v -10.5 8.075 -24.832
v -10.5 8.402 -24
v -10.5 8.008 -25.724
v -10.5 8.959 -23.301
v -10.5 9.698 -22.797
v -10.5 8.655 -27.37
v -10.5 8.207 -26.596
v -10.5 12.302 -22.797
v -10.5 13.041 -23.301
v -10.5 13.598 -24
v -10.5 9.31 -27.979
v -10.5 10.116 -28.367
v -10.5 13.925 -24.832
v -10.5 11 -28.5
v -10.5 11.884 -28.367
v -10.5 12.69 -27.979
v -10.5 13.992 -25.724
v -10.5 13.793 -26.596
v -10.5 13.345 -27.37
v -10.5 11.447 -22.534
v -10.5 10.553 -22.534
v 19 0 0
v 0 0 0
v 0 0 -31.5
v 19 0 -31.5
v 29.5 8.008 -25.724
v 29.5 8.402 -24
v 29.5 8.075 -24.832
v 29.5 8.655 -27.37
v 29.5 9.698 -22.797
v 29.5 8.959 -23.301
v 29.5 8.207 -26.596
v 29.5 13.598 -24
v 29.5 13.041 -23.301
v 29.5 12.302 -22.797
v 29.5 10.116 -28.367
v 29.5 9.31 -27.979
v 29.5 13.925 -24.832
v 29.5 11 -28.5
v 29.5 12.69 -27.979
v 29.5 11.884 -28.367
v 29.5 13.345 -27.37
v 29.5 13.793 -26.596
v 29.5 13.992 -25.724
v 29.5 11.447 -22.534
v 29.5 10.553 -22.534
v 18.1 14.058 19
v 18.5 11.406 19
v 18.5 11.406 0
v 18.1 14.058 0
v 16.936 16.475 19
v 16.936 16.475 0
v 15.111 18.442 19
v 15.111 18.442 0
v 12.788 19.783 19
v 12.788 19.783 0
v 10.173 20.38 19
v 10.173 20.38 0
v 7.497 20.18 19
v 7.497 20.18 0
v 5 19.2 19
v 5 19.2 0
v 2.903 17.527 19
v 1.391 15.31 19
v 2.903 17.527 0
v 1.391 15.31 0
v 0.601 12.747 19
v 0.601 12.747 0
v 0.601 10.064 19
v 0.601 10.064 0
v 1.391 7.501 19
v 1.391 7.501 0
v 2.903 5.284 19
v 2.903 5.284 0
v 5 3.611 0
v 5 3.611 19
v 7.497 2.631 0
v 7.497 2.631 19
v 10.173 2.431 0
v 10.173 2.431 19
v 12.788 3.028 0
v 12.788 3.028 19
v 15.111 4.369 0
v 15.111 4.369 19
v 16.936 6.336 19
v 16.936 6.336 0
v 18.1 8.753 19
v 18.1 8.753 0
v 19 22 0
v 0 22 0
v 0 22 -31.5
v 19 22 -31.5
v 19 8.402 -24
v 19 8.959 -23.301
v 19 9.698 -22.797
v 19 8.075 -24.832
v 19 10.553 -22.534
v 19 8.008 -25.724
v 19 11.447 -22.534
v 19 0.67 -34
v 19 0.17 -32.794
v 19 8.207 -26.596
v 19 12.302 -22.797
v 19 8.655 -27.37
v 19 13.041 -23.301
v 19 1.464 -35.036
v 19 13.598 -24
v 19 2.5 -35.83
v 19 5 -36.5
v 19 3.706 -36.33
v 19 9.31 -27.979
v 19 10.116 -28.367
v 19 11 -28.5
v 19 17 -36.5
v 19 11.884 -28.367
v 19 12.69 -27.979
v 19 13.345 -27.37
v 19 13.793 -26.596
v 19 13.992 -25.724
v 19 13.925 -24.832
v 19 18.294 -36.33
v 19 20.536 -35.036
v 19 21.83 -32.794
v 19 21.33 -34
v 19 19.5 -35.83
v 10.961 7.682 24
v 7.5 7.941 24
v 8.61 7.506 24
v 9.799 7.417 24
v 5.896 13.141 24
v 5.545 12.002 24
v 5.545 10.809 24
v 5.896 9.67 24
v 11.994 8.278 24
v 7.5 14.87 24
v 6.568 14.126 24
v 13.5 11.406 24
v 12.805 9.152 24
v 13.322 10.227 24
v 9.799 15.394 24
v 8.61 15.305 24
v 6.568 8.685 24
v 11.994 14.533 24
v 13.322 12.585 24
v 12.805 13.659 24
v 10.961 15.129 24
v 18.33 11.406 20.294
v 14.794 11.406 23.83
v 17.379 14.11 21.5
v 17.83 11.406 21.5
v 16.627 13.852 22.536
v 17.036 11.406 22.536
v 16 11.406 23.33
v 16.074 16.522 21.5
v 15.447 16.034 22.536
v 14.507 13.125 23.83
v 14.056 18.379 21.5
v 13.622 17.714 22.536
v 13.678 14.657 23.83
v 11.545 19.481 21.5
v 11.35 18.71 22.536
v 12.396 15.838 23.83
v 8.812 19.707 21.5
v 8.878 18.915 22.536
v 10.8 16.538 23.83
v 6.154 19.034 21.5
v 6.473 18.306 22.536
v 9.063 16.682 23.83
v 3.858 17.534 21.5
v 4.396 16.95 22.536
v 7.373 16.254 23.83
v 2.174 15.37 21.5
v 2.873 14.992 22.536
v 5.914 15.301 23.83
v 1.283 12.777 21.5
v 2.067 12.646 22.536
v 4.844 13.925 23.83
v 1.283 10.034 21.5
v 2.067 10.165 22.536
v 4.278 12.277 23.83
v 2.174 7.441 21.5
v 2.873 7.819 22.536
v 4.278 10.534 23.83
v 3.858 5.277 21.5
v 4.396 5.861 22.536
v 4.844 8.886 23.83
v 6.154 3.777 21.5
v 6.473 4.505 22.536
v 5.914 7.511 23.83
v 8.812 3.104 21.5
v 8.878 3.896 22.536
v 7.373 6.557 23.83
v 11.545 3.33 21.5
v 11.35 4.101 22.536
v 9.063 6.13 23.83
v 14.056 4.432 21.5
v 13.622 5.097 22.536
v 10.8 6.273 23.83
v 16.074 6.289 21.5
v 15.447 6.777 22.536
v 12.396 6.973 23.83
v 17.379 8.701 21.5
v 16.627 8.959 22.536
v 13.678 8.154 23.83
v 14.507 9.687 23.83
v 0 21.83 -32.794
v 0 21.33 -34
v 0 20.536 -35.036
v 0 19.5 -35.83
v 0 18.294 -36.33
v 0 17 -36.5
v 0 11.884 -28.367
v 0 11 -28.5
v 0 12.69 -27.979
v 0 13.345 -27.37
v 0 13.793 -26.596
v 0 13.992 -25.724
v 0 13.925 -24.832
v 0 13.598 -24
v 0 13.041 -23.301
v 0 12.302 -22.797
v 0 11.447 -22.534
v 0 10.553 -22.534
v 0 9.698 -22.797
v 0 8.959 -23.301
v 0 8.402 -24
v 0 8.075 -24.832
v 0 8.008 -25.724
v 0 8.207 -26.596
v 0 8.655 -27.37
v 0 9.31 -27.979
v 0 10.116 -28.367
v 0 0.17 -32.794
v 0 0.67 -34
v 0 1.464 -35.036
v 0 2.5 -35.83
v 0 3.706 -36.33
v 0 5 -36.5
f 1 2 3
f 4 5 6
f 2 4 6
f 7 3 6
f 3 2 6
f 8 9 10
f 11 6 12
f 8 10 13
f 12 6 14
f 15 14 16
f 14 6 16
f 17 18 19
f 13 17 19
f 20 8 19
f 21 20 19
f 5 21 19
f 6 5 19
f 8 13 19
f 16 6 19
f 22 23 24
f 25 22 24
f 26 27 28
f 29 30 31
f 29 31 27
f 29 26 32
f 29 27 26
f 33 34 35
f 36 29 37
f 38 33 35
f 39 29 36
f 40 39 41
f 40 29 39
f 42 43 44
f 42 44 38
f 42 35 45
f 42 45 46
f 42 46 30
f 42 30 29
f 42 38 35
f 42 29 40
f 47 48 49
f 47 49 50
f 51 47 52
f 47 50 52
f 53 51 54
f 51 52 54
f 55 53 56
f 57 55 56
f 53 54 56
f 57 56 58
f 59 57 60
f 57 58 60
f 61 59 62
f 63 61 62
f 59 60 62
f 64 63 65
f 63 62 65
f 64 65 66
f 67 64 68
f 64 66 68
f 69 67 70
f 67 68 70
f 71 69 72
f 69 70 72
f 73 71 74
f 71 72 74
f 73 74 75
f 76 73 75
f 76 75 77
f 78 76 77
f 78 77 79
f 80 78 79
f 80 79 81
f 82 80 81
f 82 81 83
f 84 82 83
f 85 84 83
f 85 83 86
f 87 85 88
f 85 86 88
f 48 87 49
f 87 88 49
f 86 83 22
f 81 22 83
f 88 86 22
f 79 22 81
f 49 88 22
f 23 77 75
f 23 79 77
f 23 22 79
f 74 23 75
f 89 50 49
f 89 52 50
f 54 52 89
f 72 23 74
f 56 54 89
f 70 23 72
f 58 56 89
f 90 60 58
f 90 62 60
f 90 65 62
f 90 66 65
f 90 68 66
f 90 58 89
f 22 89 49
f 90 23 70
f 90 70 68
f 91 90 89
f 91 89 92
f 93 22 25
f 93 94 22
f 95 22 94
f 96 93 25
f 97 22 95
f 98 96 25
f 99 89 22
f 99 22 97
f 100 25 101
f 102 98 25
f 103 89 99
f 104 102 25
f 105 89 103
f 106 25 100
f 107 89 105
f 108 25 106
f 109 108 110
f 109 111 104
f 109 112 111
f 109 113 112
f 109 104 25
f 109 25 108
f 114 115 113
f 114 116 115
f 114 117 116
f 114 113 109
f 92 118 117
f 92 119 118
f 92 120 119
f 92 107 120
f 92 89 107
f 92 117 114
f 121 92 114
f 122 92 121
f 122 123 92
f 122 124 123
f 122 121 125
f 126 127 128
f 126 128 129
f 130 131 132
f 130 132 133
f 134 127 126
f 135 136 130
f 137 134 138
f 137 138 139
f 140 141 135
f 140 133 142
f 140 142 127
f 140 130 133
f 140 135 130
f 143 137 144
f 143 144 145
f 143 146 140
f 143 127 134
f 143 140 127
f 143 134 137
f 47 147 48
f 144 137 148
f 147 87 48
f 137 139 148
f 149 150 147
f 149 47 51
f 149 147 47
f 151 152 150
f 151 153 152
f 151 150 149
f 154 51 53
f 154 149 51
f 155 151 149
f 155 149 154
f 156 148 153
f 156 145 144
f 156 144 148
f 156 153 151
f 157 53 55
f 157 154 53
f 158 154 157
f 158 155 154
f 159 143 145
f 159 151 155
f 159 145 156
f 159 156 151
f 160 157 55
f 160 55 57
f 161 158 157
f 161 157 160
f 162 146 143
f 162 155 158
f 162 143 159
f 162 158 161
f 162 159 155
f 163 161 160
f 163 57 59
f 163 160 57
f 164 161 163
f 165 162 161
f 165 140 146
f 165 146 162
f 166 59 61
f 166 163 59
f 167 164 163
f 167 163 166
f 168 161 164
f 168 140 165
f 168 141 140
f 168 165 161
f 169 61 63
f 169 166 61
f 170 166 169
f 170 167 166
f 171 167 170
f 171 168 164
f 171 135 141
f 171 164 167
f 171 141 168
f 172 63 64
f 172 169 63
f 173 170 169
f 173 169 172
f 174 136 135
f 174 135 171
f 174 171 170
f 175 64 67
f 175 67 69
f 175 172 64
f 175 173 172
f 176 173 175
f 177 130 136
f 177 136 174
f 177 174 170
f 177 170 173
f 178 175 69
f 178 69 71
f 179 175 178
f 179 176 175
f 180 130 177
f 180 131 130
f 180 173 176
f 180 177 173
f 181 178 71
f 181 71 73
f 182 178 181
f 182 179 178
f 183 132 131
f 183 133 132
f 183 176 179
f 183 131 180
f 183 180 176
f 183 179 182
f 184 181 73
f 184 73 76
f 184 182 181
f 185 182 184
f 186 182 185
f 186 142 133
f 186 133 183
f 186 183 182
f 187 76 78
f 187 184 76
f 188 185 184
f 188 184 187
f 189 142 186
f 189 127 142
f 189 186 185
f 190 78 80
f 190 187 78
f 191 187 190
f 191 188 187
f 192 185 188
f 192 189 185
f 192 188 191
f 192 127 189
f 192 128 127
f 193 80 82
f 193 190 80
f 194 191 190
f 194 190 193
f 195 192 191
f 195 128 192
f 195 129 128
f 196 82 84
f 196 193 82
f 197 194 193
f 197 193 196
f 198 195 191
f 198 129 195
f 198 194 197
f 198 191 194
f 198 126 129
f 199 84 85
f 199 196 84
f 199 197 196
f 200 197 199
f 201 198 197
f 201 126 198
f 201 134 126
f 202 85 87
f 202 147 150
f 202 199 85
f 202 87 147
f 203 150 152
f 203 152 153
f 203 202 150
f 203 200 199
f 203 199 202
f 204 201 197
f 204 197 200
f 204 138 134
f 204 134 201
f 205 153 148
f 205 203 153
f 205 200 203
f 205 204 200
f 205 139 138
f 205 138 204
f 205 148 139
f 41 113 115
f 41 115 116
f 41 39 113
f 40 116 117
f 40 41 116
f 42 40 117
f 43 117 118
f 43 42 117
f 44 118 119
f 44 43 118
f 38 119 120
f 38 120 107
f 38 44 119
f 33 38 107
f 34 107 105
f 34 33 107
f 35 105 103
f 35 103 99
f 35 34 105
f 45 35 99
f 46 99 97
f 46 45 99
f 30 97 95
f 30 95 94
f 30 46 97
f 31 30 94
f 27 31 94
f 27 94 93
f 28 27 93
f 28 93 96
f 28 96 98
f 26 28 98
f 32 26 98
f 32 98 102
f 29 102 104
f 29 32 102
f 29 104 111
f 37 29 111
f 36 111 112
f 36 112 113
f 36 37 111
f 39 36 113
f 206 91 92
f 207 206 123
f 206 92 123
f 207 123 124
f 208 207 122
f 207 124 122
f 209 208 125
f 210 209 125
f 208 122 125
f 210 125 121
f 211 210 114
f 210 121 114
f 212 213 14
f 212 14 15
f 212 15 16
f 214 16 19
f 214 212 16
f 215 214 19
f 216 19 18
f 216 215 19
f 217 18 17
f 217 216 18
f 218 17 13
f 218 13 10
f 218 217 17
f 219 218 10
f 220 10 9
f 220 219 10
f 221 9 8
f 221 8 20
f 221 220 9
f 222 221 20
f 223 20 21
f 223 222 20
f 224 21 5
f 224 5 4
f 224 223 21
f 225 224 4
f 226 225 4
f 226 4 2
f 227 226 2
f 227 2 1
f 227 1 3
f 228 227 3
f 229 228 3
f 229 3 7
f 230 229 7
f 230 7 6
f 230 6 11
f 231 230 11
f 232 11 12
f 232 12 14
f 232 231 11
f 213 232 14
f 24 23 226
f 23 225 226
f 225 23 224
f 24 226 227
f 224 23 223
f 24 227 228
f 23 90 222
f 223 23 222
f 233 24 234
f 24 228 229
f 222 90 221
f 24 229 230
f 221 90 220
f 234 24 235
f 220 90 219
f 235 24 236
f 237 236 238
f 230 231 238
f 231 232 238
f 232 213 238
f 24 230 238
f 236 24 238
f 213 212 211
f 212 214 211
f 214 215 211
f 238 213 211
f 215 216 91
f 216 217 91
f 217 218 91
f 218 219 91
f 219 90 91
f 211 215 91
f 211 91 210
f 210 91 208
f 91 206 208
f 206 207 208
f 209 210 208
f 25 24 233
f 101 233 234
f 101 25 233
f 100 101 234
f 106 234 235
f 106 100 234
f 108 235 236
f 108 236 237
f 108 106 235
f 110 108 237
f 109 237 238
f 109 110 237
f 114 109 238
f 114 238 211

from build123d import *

# Parameters (mm, degrees)
SKETCH_1_W      = 36.5
SKETCH_1_H      = 22
EXTRUDE_1_DEPTH = 19
SKETCH_3_R      = 3
EXTRUDE_3_DEPTH = 20
FILLET_1_R      = 5
SKETCH_4_R      = 9
EXTRUDE_4_DEPTH = 24
FILLET_2_R      = 5


with BuildPart() as part:
    # 草图1 → 凸台-拉伸1 (new body)
    with BuildSketch(Plane(origin=(0, 0, 0), x_dir=(0, 0, -1), z_dir=(1, 0, 0))):
        with Locations((18.25, 11)):
            Rectangle(SKETCH_1_W, SKETCH_1_H)
    extrude(amount=EXTRUDE_1_DEPTH)

    # 草图3 → 凸台-拉伸3 (add, symmetric)
    with BuildSketch(Plane(origin=(9.5, 0, 0), x_dir=(0, 0, -1), z_dir=(1, 0, 0))):
        with Locations((25.5, 11)):
            Circle(SKETCH_3_R)
    extrude(amount=EXTRUDE_3_DEPTH, both=True)

    # 圆角1
    fillet_1_edges = [part.edges().sort_by_distance(p)[0] for p in [
        (9.5, 22, -36.5),
        (9.5, 0, -36.5),
    ]]
    fillet(fillet_1_edges, radius=FILLET_1_R)

    # 草图4 → 凸台-拉伸4 (add)
    with BuildSketch(Plane.XY):
        with Locations((9.5, 11.405533056)):
            Circle(SKETCH_4_R)
    extrude(amount=EXTRUDE_4_DEPTH)

    # 圆角2
    fillet_2_edges = [part.edges().sort_by_distance(p)[0] for p in [
        (0.5, 11.405533056, 24),
    ]]
    fillet(fillet_2_edges, radius=FILLET_2_R)


solid = part.part
